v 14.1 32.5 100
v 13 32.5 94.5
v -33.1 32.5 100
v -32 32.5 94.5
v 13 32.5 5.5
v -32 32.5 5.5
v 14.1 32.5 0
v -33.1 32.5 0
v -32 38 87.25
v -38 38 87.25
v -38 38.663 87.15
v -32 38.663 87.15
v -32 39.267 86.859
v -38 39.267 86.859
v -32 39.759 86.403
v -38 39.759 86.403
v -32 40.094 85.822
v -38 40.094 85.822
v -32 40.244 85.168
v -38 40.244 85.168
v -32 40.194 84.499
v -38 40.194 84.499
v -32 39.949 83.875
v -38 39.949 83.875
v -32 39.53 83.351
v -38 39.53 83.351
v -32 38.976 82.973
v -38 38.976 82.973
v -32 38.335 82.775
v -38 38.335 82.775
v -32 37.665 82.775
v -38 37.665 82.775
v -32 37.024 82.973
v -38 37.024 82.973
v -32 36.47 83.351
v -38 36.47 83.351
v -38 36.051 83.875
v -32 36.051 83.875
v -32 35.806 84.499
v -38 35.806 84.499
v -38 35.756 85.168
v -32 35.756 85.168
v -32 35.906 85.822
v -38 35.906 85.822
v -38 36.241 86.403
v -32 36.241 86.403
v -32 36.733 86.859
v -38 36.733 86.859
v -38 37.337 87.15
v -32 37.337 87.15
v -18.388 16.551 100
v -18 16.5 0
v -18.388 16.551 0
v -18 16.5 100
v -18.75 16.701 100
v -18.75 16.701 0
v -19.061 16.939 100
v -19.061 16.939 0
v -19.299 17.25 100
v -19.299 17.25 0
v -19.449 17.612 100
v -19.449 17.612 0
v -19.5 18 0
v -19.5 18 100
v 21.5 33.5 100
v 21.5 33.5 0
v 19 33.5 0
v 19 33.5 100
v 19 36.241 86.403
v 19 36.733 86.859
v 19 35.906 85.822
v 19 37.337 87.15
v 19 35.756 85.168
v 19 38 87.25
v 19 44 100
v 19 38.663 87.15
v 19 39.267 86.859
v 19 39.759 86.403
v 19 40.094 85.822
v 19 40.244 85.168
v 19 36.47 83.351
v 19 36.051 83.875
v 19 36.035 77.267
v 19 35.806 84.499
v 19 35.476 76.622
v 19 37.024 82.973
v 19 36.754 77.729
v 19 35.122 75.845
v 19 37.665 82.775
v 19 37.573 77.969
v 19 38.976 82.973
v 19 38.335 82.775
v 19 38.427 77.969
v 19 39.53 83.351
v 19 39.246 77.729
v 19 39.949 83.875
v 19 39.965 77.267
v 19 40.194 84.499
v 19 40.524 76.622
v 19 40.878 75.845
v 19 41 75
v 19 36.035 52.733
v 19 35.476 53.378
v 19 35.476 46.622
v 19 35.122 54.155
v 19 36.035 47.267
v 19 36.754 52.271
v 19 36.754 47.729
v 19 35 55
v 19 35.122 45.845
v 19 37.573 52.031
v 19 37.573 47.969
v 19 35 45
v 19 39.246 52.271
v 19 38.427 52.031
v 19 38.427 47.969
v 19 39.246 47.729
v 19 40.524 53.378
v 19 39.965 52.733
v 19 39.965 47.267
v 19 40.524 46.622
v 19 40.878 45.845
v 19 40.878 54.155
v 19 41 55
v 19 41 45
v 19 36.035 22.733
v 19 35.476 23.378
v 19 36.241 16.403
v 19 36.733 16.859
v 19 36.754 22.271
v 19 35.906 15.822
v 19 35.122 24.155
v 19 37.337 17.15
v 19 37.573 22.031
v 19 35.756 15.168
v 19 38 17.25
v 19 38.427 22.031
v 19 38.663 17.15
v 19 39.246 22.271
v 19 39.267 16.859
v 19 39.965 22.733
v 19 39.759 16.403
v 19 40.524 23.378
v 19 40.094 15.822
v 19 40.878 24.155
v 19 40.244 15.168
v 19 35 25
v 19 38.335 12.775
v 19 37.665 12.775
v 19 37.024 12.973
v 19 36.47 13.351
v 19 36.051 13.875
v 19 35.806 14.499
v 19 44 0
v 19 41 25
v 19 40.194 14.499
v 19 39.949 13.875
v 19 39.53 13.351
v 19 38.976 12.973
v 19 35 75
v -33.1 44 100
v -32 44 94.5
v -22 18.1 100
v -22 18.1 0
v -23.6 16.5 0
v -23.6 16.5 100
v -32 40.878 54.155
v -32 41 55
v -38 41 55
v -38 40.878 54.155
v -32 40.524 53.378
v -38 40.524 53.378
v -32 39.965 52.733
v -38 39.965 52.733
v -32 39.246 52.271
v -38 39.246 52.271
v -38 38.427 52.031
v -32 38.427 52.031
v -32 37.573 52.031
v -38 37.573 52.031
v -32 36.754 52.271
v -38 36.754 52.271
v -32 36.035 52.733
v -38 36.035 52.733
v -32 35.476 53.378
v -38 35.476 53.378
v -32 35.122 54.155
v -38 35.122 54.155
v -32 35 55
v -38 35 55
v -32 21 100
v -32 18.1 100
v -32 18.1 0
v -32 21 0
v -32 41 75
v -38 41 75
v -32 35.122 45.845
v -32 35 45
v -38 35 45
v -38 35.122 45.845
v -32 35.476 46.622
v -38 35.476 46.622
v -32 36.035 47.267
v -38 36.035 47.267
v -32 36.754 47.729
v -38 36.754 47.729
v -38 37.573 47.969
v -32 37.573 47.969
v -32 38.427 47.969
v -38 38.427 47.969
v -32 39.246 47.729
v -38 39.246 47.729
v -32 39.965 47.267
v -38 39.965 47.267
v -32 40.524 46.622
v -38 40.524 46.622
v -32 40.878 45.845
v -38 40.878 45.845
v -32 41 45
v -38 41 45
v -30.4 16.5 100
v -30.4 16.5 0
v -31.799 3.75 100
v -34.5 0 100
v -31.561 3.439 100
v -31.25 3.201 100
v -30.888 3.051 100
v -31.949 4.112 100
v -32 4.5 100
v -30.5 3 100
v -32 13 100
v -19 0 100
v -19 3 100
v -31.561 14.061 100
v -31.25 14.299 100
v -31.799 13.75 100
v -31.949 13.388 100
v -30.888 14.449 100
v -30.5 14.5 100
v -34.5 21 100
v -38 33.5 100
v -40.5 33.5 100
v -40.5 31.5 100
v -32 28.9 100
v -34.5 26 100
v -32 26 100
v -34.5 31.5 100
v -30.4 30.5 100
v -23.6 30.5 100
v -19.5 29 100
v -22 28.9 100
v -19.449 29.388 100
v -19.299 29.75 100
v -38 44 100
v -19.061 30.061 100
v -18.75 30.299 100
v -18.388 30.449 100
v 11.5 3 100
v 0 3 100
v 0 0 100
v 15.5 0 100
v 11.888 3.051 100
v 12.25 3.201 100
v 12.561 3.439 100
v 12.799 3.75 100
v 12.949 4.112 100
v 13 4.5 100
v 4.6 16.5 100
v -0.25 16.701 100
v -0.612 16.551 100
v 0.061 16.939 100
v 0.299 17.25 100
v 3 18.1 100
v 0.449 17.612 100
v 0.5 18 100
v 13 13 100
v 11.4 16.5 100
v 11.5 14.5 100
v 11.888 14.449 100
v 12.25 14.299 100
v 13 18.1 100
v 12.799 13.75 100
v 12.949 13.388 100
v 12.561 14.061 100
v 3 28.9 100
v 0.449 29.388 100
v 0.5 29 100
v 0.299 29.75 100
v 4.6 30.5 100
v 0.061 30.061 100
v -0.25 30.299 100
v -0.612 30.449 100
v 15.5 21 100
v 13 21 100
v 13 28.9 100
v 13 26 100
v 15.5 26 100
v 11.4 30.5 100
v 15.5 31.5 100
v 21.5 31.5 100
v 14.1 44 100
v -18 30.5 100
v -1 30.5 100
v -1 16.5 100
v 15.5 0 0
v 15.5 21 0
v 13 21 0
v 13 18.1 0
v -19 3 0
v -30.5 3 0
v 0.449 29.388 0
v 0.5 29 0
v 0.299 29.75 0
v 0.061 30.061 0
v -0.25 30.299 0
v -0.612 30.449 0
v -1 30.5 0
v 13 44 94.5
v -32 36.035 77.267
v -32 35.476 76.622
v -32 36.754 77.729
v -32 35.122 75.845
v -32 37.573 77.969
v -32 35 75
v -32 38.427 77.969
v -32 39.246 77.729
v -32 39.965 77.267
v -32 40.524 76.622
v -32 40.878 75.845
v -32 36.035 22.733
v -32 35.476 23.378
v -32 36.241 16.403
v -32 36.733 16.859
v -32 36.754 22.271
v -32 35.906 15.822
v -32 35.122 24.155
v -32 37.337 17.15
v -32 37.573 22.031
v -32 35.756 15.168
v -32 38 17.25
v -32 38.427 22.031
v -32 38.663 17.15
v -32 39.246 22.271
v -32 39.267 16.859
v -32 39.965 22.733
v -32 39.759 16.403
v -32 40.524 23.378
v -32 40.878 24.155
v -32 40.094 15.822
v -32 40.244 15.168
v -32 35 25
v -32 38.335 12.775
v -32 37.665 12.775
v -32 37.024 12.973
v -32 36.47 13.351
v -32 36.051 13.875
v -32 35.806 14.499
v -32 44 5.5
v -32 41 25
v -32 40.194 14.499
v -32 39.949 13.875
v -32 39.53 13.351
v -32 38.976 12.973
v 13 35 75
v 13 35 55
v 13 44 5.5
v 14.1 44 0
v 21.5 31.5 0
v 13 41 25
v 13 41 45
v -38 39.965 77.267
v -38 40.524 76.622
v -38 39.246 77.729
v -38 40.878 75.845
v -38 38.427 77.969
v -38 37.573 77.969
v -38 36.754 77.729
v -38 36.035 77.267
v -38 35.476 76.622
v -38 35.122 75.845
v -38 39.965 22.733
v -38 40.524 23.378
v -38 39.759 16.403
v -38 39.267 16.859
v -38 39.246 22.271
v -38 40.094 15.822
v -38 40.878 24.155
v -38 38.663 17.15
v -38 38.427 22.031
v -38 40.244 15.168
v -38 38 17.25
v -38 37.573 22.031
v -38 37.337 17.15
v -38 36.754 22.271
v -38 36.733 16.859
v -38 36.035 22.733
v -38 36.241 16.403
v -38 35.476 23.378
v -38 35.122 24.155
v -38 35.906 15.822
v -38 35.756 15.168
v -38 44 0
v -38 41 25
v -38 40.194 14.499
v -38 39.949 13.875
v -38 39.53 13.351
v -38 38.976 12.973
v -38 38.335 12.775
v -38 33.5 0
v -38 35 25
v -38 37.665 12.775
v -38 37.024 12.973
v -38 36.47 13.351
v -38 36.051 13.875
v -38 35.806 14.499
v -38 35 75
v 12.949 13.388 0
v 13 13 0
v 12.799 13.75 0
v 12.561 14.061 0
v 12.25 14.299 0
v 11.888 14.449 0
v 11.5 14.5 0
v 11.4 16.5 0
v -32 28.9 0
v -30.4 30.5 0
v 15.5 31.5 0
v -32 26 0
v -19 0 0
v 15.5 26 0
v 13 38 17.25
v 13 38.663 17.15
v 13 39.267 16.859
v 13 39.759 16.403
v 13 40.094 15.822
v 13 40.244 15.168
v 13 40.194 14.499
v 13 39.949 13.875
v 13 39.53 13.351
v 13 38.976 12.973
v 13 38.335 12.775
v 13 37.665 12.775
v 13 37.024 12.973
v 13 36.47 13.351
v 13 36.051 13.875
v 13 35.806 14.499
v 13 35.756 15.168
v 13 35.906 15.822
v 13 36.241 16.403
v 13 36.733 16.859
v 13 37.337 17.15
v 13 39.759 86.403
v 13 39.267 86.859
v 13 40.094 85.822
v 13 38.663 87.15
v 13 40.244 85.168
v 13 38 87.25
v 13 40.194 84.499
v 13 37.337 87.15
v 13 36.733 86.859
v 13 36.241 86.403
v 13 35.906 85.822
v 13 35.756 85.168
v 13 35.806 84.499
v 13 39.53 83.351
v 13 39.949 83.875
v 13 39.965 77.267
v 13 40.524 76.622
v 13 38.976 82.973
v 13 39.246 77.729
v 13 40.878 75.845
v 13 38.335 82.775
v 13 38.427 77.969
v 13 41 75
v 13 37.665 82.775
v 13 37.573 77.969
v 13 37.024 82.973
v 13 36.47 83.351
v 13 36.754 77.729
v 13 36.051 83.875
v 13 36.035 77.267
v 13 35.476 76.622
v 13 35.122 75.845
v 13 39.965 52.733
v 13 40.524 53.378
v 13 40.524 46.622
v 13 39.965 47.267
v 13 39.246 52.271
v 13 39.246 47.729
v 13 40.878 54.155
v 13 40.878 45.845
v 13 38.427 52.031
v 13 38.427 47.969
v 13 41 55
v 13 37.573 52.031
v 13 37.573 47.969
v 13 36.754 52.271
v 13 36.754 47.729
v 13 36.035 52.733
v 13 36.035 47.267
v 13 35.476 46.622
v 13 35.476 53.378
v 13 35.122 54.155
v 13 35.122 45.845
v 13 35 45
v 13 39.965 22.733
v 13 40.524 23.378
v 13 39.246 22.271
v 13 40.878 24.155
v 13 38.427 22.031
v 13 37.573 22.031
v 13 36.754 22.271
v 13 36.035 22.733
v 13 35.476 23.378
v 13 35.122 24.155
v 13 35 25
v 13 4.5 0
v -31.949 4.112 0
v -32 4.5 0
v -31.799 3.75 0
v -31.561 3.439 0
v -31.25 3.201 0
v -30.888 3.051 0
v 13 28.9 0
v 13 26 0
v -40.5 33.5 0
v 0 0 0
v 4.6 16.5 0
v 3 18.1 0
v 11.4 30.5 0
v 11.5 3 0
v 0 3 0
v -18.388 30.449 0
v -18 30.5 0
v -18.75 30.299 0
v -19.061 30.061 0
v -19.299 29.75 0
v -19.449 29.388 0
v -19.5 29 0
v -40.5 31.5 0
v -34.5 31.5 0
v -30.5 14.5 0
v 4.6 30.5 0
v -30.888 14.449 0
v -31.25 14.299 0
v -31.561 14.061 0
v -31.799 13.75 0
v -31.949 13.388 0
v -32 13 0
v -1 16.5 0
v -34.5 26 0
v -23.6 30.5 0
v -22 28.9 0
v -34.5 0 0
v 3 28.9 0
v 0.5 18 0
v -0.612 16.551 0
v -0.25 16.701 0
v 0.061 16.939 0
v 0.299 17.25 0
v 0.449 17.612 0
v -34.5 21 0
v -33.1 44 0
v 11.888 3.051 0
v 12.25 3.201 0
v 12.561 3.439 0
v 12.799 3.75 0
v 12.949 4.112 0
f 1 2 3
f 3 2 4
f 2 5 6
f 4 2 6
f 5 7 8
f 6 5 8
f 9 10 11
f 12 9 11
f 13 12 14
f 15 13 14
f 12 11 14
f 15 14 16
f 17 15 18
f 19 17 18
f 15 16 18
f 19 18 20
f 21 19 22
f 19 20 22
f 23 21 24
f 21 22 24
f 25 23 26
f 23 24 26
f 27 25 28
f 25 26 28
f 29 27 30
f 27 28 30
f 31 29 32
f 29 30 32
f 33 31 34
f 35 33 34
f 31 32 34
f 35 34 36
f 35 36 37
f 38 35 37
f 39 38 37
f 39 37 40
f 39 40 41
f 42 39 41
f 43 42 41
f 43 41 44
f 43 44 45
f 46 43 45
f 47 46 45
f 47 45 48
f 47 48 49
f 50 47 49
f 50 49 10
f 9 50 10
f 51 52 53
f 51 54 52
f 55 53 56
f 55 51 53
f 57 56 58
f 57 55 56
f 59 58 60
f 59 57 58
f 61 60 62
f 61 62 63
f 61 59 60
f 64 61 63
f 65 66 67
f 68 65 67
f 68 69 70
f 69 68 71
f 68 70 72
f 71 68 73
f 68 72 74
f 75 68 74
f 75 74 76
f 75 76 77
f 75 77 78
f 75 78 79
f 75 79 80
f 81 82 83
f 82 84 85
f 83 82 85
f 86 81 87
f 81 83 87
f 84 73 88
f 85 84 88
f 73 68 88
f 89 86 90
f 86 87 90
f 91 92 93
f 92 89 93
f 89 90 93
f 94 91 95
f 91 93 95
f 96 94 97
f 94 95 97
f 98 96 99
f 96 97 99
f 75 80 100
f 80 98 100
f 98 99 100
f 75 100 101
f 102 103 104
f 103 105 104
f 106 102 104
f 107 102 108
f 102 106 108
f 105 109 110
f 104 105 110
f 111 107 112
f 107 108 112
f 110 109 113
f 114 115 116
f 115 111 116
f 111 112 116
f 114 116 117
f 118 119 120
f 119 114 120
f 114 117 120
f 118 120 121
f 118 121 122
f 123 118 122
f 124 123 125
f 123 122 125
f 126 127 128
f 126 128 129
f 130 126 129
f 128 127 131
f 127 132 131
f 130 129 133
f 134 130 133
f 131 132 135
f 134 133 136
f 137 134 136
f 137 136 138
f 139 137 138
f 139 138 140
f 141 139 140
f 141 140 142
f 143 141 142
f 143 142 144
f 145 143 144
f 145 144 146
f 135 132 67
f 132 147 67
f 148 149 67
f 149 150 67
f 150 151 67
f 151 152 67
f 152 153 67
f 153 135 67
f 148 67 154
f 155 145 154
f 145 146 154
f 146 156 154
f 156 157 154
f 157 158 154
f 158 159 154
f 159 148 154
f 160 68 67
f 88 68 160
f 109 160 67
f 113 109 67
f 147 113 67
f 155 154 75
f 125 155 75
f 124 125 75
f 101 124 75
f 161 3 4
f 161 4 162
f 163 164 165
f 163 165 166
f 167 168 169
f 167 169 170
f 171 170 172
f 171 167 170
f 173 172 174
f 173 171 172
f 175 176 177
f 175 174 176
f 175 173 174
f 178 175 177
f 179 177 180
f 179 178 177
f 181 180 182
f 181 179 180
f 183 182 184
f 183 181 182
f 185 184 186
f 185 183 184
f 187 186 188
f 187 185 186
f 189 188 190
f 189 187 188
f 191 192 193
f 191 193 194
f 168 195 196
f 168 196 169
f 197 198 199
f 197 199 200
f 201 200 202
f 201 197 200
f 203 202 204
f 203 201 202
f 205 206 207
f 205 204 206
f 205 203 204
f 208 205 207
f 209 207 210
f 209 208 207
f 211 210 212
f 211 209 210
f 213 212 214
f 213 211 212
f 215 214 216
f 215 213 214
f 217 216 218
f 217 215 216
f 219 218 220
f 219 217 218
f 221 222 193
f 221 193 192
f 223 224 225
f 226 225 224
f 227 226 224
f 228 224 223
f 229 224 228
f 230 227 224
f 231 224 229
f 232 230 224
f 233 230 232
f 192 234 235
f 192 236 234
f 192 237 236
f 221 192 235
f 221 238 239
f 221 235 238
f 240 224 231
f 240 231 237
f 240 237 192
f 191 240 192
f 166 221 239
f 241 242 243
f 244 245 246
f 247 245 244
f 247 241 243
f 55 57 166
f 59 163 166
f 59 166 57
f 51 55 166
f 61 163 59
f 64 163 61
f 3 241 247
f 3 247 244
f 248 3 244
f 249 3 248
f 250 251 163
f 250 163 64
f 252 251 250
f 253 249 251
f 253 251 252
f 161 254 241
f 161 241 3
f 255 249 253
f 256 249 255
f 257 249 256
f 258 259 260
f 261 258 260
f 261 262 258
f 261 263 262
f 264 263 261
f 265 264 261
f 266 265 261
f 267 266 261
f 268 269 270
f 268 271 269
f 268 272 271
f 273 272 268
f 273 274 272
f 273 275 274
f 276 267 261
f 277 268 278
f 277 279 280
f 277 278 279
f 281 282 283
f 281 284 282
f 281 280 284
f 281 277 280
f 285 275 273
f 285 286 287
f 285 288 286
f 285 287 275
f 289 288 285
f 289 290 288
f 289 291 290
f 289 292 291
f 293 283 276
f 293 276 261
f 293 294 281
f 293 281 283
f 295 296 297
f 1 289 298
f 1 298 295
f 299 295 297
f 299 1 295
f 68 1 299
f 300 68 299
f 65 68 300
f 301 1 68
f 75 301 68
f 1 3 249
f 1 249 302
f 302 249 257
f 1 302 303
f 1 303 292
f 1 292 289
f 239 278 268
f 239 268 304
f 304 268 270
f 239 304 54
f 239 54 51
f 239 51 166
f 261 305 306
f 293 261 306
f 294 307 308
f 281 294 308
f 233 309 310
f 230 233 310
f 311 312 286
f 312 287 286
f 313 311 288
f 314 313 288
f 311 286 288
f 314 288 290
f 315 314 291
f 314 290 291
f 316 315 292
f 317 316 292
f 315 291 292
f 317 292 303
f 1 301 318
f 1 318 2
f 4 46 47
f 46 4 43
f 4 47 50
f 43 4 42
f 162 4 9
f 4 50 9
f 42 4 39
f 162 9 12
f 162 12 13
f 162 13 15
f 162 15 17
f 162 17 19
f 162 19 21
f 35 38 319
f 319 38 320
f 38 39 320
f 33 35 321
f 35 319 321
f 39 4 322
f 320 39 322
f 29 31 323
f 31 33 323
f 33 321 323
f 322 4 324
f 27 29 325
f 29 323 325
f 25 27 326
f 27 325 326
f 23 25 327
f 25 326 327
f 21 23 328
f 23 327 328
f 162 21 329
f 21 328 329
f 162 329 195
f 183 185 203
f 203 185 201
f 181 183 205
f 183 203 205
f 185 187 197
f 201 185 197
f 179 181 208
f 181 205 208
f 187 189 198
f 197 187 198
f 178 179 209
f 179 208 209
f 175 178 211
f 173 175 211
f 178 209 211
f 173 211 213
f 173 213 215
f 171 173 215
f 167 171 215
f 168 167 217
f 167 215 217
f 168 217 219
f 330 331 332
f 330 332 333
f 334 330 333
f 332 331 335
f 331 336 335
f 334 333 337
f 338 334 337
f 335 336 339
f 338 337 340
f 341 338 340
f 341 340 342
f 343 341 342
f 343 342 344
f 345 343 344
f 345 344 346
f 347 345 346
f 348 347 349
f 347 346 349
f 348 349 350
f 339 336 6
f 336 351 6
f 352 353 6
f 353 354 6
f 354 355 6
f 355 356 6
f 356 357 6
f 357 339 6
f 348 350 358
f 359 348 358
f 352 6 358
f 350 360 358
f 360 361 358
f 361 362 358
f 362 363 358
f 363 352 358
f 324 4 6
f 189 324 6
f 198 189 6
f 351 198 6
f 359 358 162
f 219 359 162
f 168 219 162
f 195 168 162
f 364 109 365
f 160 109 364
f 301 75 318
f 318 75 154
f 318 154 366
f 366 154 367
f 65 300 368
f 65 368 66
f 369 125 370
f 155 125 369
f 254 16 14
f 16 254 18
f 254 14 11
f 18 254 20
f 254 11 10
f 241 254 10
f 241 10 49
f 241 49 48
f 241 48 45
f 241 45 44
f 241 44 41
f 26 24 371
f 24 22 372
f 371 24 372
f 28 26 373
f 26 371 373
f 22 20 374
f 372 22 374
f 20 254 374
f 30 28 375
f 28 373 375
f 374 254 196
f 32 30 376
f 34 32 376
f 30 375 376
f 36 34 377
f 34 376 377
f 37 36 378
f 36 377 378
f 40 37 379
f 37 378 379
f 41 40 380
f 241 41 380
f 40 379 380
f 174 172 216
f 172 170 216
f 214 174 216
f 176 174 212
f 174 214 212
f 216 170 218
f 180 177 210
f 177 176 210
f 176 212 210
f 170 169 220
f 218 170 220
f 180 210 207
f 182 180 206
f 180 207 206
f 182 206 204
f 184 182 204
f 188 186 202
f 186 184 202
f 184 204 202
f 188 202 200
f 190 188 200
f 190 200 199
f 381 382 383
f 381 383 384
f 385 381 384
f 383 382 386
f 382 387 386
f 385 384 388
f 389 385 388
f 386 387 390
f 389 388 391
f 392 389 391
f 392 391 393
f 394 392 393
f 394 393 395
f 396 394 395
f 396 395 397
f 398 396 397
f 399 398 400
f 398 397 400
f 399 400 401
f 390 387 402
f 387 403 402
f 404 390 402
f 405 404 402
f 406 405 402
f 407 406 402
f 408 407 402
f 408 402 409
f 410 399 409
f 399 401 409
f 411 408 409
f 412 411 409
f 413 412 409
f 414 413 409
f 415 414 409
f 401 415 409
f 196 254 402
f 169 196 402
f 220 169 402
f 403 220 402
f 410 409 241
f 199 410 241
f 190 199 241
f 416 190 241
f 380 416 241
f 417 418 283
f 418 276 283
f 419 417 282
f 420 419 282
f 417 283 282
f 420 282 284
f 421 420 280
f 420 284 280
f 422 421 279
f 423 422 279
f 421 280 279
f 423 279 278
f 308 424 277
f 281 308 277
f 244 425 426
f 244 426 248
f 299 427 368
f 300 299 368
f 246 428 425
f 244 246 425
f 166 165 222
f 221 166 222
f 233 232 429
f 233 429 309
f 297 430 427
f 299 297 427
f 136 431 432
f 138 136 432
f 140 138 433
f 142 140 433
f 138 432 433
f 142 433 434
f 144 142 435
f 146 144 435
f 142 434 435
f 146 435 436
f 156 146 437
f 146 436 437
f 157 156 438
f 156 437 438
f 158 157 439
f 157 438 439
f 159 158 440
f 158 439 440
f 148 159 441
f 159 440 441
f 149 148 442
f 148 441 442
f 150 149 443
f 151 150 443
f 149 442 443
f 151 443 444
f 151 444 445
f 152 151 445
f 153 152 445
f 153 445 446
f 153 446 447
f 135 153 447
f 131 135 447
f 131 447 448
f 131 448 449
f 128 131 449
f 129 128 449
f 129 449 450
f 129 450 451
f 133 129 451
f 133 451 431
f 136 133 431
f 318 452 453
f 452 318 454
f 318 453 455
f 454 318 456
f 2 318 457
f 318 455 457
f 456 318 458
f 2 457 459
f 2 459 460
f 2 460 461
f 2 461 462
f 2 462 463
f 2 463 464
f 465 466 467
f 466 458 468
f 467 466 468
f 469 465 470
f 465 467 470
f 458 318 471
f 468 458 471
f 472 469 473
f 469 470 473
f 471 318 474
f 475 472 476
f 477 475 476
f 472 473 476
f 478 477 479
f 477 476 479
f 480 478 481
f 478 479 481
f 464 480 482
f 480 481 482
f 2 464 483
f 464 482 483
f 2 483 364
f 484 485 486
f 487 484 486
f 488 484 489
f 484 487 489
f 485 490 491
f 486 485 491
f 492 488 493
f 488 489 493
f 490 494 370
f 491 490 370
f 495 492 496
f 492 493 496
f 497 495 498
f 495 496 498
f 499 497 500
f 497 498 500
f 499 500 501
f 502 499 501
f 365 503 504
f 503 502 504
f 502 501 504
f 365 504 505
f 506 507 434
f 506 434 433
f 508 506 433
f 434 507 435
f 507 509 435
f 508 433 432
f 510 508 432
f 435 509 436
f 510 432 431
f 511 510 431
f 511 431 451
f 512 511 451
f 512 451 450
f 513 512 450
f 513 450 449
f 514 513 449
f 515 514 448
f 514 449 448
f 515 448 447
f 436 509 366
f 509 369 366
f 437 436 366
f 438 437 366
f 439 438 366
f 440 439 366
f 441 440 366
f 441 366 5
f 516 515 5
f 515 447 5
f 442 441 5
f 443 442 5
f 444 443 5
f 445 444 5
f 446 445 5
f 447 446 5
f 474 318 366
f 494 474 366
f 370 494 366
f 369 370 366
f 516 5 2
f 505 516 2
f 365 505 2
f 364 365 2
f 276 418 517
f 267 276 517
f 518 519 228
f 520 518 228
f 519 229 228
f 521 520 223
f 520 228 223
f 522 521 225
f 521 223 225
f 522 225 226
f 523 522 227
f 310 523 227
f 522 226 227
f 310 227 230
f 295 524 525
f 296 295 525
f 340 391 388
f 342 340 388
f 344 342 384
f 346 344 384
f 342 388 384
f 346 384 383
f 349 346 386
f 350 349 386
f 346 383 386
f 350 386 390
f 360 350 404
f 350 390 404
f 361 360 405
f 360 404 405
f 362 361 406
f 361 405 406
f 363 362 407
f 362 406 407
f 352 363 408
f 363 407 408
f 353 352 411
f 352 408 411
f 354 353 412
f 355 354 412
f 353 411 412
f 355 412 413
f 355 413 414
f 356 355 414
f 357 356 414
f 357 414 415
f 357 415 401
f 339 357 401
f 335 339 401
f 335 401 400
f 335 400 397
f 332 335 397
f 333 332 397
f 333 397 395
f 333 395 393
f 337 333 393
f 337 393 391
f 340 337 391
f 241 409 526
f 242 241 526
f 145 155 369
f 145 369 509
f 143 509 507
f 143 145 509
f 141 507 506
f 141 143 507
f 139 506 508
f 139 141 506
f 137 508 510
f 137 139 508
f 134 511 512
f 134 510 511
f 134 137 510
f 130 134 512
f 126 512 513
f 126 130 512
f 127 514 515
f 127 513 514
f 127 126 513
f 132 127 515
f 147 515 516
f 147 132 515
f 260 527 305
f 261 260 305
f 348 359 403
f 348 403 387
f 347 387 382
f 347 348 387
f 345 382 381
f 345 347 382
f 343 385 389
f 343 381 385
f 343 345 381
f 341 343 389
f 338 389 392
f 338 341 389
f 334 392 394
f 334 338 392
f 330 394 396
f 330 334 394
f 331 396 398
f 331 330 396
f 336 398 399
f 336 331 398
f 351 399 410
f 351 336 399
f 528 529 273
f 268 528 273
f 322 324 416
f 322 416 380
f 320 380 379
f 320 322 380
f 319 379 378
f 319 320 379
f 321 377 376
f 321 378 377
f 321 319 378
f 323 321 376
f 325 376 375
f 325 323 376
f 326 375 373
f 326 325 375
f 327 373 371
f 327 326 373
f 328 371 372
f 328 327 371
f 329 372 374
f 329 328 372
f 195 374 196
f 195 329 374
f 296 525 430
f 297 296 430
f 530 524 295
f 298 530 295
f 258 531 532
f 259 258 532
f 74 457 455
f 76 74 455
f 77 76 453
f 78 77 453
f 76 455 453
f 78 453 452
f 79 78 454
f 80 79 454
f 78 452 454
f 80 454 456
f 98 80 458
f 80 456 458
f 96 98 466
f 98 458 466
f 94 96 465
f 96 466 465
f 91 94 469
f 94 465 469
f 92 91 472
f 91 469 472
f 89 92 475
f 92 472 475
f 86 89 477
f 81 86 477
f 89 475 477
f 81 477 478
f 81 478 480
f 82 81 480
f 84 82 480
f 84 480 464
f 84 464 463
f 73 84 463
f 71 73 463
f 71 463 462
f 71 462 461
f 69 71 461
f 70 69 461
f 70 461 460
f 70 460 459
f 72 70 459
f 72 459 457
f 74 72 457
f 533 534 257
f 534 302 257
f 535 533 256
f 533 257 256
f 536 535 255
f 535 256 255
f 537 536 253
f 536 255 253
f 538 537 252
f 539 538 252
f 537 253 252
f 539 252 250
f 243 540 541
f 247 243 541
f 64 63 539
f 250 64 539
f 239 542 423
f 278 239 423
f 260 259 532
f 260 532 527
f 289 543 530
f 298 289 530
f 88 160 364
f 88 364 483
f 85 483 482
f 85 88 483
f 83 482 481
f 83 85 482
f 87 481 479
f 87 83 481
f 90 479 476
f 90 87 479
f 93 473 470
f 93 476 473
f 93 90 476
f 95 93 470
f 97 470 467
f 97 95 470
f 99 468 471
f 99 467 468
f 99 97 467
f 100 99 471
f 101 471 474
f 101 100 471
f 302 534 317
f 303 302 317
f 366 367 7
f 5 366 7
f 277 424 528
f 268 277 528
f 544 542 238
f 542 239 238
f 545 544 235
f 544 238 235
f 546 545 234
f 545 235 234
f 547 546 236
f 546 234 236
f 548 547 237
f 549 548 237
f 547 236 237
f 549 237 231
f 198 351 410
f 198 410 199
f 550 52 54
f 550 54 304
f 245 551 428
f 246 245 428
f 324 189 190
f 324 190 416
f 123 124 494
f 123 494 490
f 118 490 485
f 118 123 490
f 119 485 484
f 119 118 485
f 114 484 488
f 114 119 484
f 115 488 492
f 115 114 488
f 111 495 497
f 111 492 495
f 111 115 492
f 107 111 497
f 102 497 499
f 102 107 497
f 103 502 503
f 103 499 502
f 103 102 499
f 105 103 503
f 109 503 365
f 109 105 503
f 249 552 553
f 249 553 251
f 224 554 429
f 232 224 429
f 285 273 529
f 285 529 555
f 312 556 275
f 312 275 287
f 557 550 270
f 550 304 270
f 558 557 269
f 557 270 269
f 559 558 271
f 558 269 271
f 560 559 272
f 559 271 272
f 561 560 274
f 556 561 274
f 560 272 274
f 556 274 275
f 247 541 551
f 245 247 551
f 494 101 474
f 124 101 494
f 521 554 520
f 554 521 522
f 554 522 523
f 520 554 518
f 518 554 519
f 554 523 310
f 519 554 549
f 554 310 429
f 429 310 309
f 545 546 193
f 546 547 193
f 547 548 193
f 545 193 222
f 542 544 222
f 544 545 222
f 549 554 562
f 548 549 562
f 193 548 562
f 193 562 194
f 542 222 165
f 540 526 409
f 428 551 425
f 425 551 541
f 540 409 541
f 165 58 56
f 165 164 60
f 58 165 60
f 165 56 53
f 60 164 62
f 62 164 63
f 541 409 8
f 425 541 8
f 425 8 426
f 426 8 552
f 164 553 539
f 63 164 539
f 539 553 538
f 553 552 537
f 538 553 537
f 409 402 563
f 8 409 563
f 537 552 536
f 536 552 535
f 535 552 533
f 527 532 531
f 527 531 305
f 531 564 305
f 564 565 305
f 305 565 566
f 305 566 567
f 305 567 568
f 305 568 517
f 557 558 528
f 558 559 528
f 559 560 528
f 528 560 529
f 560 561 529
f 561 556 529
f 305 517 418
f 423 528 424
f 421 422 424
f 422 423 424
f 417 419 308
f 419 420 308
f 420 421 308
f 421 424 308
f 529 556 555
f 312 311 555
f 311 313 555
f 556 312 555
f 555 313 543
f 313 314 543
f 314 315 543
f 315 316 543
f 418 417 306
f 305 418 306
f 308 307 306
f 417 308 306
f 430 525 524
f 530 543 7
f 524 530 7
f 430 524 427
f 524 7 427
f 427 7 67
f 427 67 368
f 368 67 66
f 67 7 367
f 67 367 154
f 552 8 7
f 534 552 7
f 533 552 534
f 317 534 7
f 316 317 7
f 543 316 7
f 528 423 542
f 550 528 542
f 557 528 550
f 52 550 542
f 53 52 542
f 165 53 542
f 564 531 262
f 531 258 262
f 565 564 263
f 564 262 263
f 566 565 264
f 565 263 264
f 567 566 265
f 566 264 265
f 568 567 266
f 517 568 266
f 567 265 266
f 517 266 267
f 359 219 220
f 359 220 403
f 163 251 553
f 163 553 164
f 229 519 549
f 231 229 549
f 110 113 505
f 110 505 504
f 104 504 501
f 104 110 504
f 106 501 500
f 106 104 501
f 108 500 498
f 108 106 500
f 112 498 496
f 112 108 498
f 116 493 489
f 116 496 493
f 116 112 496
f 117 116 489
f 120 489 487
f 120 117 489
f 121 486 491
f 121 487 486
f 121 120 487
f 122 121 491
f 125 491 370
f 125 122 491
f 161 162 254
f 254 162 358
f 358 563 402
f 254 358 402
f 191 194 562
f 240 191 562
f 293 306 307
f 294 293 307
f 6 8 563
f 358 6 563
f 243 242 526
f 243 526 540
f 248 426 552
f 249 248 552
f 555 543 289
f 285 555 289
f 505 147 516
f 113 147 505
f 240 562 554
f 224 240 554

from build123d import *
from OCP.BRepFilletAPI import BRepFilletAPI_MakeChamfer

# Parameters (mm, degrees)
SCHIZZO1_W                   = 20
SCHIZZO1_H                   = 14
ESTRUSIONE_ESTRUSIONE1_DEPTH = 100
SMUSSO1_SIZE                 = 1.6
RACCORDO1_R                  = 1.5
SMUSSO2_SIZE                 = 5.5
SMUSSO2_SIZE2                = 1.1
SMUSSO3_SIZE                 = 5.5
SMUSSO3_SIZE2                = 1.1
FORO_PER_VITE_M4_1_D         = 4.5
FORO_PER_VITE_M4_1_DEPTH     = 188
FORO_PER_VITE_M4_1_TIP       = 1.351936393
TAGLIO_ESTRUSIONE1_DEPTH     = 81


with BuildPart() as part:
    # Schizzo1 → Estrusione-Estrusione1 (new body)
    with BuildSketch(Plane.XY):
        Polygon((0, 0), (15.5, 0), (15.5, 21), (13, 21), (13, 16.5), (3, 16.5), (3, 30.5), (13, 30.5), (13, 26), (15.5, 26), (15.5, 31.5), (21.5, 31.5), (21.5, 33.5), (19, 33.5), (19, 44), (13, 44), (13, 32.5), (-32, 32.5), (-32, 44), (-38, 44), (-38, 33.5), (-40.5, 33.5), (-40.5, 31.5), (-34.5, 31.5), (-34.5, 26), (-32, 26), (-32, 30.5), (-22, 30.5), (-22, 16.5), (-32, 16.5), (-32, 21), (-34.5, 21), (-34.5, 0), (-19, 0), (-19, 3), (-32, 3), (-32, 14.5), (13, 14.5), (13, 3), (0, 3), align=None)
        with Locations((-9.5, 23.5)):
            Rectangle(SCHIZZO1_W, SCHIZZO1_H, mode=Mode.SUBTRACT)
    extrude(amount=ESTRUSIONE_ESTRUSIONE1_DEPTH)

    # Smusso1
    smusso1_edges = [part.edges().sort_by_distance(p)[0] for p in [
        (-32, 16.5, 50),
        (-22, 16.5, 50),
        (-22, 30.5, 50),
        (-32, 30.5, 50),
        (13, 30.5, 50),
        (3, 30.5, 50),
        (3, 16.5, 50),
        (13, 16.5, 50),
    ]]
    chamfer(smusso1_edges, length=SMUSSO1_SIZE)

    # Raccordo1
    raccordo1_edges = [part.edges().sort_by_distance(p)[0] for p in [
        (13, 3, 50),
        (13, 14.5, 50),
        (-32, 14.5, 50),
        (-32, 3, 50),
        (-19.5, 30.5, 50),
        (-19.5, 16.5, 50),
        (0.5, 16.5, 50),
        (0.5, 30.5, 50),
    ]]
    fillet(raccordo1_edges, radius=RACCORDO1_R)

    # Smusso2: one chamfer whose edges measure the first distance from different faces: ONE call of the kernel's chamfer builder (chamfer() names one face for all edges)
    smusso2_edges_1 = [part.edges().sort_by_distance(p)[0] for p in [
        (13, 38.25, 100),
    ]]
    smusso2_side_1 = [part.faces().sort_by_distance(p)[0] for p in [
        (13, 38.25, 50),
    ]]
    smusso2_edges_2 = [part.edges().sort_by_distance(p)[0] for p in [
        (-32, 38.25, 100),
    ]]
    smusso2_side_2 = [part.faces().sort_by_distance(p)[0] for p in [
        (-32, 38.25, 50),
    ]]
    smusso2 = BRepFilletAPI_MakeChamfer(part.part.solid().wrapped)
    for e in smusso2_edges_1:
        smusso2.Add(SMUSSO2_SIZE, SMUSSO2_SIZE2, e.wrapped, smusso2_side_1[0].wrapped)  # the first distance lies on this face
    for e in smusso2_edges_2:
        smusso2.Add(SMUSSO2_SIZE, SMUSSO2_SIZE2, e.wrapped, smusso2_side_2[0].wrapped)  # the first distance lies on this face
    add(Compound.cast(smusso2.Shape()), mode=Mode.REPLACE)

    # Smusso3: one chamfer whose edges measure the first distance from different faces: ONE call of the kernel's chamfer builder (chamfer() names one face for all edges)
    smusso3_edges_1 = [part.edges().sort_by_distance(p)[0] for p in [
        (-32, 38.25, 0),
    ]]
    smusso3_side_1 = [part.faces().sort_by_distance(p)[0] for p in [
        (-32, 38.25, 47.25),
    ]]
    smusso3_edges_2 = [part.edges().sort_by_distance(p)[0] for p in [
        (13, 38.25, 0),
    ]]
    smusso3_side_2 = [part.faces().sort_by_distance(p)[0] for p in [
        (13, 38.25, 47.25),
    ]]
    smusso3 = BRepFilletAPI_MakeChamfer(part.part.solid().wrapped)
    for e in smusso3_edges_1:
        smusso3.Add(SMUSSO3_SIZE, SMUSSO3_SIZE2, e.wrapped, smusso3_side_1[0].wrapped)  # the first distance lies on this face
    for e in smusso3_edges_2:
        smusso3.Add(SMUSSO3_SIZE, SMUSSO3_SIZE2, e.wrapped, smusso3_side_2[0].wrapped)  # the first distance lies on this face
    add(Compound.cast(smusso3.Shape()), mode=Mode.REPLACE)

    # Foro per Vite M4-1
    with Locations(Plane(origin=(19, 0, 0), x_dir=(0, 0, -1), z_dir=(1, 0, 0))):
        with Locations((-85, 38), (-15, 38)):
            Hole(FORO_PER_VITE_M4_1_D / 2, depth=FORO_PER_VITE_M4_1_DEPTH)
            with Locations((0, 0, -(FORO_PER_VITE_M4_1_DEPTH + FORO_PER_VITE_M4_1_TIP / 2))):  # 118° drill point
                Cone(0, FORO_PER_VITE_M4_1_D / 2, FORO_PER_VITE_M4_1_TIP, mode=Mode.SUBTRACT)

    # Schizzo4 → Taglio-Estrusione1 (cut)
    with BuildSketch(Plane(origin=(19, 0, 0), x_dir=(0, 0, -1), z_dir=(1, 0, 0))):
        with BuildLine():
            Line((-75, 41), (-55, 41))
            ThreePointArc((-55, 41), (-52, 38), (-55, 35))
            Line((-55, 35), (-75, 35))
            ThreePointArc((-75, 35), (-78, 38), (-75, 41))
        make_face()
        with BuildLine():
            Line((-45, 41), (-25, 41))
            ThreePointArc((-25, 41), (-22, 38), (-25, 35))
            Line((-25, 35), (-45, 35))
            ThreePointArc((-45, 35), (-48, 38), (-45, 41))
        make_face()
    extrude(amount=-TAGLIO_ESTRUSIONE1_DEPTH, mode=Mode.SUBTRACT)


solid = part.part
